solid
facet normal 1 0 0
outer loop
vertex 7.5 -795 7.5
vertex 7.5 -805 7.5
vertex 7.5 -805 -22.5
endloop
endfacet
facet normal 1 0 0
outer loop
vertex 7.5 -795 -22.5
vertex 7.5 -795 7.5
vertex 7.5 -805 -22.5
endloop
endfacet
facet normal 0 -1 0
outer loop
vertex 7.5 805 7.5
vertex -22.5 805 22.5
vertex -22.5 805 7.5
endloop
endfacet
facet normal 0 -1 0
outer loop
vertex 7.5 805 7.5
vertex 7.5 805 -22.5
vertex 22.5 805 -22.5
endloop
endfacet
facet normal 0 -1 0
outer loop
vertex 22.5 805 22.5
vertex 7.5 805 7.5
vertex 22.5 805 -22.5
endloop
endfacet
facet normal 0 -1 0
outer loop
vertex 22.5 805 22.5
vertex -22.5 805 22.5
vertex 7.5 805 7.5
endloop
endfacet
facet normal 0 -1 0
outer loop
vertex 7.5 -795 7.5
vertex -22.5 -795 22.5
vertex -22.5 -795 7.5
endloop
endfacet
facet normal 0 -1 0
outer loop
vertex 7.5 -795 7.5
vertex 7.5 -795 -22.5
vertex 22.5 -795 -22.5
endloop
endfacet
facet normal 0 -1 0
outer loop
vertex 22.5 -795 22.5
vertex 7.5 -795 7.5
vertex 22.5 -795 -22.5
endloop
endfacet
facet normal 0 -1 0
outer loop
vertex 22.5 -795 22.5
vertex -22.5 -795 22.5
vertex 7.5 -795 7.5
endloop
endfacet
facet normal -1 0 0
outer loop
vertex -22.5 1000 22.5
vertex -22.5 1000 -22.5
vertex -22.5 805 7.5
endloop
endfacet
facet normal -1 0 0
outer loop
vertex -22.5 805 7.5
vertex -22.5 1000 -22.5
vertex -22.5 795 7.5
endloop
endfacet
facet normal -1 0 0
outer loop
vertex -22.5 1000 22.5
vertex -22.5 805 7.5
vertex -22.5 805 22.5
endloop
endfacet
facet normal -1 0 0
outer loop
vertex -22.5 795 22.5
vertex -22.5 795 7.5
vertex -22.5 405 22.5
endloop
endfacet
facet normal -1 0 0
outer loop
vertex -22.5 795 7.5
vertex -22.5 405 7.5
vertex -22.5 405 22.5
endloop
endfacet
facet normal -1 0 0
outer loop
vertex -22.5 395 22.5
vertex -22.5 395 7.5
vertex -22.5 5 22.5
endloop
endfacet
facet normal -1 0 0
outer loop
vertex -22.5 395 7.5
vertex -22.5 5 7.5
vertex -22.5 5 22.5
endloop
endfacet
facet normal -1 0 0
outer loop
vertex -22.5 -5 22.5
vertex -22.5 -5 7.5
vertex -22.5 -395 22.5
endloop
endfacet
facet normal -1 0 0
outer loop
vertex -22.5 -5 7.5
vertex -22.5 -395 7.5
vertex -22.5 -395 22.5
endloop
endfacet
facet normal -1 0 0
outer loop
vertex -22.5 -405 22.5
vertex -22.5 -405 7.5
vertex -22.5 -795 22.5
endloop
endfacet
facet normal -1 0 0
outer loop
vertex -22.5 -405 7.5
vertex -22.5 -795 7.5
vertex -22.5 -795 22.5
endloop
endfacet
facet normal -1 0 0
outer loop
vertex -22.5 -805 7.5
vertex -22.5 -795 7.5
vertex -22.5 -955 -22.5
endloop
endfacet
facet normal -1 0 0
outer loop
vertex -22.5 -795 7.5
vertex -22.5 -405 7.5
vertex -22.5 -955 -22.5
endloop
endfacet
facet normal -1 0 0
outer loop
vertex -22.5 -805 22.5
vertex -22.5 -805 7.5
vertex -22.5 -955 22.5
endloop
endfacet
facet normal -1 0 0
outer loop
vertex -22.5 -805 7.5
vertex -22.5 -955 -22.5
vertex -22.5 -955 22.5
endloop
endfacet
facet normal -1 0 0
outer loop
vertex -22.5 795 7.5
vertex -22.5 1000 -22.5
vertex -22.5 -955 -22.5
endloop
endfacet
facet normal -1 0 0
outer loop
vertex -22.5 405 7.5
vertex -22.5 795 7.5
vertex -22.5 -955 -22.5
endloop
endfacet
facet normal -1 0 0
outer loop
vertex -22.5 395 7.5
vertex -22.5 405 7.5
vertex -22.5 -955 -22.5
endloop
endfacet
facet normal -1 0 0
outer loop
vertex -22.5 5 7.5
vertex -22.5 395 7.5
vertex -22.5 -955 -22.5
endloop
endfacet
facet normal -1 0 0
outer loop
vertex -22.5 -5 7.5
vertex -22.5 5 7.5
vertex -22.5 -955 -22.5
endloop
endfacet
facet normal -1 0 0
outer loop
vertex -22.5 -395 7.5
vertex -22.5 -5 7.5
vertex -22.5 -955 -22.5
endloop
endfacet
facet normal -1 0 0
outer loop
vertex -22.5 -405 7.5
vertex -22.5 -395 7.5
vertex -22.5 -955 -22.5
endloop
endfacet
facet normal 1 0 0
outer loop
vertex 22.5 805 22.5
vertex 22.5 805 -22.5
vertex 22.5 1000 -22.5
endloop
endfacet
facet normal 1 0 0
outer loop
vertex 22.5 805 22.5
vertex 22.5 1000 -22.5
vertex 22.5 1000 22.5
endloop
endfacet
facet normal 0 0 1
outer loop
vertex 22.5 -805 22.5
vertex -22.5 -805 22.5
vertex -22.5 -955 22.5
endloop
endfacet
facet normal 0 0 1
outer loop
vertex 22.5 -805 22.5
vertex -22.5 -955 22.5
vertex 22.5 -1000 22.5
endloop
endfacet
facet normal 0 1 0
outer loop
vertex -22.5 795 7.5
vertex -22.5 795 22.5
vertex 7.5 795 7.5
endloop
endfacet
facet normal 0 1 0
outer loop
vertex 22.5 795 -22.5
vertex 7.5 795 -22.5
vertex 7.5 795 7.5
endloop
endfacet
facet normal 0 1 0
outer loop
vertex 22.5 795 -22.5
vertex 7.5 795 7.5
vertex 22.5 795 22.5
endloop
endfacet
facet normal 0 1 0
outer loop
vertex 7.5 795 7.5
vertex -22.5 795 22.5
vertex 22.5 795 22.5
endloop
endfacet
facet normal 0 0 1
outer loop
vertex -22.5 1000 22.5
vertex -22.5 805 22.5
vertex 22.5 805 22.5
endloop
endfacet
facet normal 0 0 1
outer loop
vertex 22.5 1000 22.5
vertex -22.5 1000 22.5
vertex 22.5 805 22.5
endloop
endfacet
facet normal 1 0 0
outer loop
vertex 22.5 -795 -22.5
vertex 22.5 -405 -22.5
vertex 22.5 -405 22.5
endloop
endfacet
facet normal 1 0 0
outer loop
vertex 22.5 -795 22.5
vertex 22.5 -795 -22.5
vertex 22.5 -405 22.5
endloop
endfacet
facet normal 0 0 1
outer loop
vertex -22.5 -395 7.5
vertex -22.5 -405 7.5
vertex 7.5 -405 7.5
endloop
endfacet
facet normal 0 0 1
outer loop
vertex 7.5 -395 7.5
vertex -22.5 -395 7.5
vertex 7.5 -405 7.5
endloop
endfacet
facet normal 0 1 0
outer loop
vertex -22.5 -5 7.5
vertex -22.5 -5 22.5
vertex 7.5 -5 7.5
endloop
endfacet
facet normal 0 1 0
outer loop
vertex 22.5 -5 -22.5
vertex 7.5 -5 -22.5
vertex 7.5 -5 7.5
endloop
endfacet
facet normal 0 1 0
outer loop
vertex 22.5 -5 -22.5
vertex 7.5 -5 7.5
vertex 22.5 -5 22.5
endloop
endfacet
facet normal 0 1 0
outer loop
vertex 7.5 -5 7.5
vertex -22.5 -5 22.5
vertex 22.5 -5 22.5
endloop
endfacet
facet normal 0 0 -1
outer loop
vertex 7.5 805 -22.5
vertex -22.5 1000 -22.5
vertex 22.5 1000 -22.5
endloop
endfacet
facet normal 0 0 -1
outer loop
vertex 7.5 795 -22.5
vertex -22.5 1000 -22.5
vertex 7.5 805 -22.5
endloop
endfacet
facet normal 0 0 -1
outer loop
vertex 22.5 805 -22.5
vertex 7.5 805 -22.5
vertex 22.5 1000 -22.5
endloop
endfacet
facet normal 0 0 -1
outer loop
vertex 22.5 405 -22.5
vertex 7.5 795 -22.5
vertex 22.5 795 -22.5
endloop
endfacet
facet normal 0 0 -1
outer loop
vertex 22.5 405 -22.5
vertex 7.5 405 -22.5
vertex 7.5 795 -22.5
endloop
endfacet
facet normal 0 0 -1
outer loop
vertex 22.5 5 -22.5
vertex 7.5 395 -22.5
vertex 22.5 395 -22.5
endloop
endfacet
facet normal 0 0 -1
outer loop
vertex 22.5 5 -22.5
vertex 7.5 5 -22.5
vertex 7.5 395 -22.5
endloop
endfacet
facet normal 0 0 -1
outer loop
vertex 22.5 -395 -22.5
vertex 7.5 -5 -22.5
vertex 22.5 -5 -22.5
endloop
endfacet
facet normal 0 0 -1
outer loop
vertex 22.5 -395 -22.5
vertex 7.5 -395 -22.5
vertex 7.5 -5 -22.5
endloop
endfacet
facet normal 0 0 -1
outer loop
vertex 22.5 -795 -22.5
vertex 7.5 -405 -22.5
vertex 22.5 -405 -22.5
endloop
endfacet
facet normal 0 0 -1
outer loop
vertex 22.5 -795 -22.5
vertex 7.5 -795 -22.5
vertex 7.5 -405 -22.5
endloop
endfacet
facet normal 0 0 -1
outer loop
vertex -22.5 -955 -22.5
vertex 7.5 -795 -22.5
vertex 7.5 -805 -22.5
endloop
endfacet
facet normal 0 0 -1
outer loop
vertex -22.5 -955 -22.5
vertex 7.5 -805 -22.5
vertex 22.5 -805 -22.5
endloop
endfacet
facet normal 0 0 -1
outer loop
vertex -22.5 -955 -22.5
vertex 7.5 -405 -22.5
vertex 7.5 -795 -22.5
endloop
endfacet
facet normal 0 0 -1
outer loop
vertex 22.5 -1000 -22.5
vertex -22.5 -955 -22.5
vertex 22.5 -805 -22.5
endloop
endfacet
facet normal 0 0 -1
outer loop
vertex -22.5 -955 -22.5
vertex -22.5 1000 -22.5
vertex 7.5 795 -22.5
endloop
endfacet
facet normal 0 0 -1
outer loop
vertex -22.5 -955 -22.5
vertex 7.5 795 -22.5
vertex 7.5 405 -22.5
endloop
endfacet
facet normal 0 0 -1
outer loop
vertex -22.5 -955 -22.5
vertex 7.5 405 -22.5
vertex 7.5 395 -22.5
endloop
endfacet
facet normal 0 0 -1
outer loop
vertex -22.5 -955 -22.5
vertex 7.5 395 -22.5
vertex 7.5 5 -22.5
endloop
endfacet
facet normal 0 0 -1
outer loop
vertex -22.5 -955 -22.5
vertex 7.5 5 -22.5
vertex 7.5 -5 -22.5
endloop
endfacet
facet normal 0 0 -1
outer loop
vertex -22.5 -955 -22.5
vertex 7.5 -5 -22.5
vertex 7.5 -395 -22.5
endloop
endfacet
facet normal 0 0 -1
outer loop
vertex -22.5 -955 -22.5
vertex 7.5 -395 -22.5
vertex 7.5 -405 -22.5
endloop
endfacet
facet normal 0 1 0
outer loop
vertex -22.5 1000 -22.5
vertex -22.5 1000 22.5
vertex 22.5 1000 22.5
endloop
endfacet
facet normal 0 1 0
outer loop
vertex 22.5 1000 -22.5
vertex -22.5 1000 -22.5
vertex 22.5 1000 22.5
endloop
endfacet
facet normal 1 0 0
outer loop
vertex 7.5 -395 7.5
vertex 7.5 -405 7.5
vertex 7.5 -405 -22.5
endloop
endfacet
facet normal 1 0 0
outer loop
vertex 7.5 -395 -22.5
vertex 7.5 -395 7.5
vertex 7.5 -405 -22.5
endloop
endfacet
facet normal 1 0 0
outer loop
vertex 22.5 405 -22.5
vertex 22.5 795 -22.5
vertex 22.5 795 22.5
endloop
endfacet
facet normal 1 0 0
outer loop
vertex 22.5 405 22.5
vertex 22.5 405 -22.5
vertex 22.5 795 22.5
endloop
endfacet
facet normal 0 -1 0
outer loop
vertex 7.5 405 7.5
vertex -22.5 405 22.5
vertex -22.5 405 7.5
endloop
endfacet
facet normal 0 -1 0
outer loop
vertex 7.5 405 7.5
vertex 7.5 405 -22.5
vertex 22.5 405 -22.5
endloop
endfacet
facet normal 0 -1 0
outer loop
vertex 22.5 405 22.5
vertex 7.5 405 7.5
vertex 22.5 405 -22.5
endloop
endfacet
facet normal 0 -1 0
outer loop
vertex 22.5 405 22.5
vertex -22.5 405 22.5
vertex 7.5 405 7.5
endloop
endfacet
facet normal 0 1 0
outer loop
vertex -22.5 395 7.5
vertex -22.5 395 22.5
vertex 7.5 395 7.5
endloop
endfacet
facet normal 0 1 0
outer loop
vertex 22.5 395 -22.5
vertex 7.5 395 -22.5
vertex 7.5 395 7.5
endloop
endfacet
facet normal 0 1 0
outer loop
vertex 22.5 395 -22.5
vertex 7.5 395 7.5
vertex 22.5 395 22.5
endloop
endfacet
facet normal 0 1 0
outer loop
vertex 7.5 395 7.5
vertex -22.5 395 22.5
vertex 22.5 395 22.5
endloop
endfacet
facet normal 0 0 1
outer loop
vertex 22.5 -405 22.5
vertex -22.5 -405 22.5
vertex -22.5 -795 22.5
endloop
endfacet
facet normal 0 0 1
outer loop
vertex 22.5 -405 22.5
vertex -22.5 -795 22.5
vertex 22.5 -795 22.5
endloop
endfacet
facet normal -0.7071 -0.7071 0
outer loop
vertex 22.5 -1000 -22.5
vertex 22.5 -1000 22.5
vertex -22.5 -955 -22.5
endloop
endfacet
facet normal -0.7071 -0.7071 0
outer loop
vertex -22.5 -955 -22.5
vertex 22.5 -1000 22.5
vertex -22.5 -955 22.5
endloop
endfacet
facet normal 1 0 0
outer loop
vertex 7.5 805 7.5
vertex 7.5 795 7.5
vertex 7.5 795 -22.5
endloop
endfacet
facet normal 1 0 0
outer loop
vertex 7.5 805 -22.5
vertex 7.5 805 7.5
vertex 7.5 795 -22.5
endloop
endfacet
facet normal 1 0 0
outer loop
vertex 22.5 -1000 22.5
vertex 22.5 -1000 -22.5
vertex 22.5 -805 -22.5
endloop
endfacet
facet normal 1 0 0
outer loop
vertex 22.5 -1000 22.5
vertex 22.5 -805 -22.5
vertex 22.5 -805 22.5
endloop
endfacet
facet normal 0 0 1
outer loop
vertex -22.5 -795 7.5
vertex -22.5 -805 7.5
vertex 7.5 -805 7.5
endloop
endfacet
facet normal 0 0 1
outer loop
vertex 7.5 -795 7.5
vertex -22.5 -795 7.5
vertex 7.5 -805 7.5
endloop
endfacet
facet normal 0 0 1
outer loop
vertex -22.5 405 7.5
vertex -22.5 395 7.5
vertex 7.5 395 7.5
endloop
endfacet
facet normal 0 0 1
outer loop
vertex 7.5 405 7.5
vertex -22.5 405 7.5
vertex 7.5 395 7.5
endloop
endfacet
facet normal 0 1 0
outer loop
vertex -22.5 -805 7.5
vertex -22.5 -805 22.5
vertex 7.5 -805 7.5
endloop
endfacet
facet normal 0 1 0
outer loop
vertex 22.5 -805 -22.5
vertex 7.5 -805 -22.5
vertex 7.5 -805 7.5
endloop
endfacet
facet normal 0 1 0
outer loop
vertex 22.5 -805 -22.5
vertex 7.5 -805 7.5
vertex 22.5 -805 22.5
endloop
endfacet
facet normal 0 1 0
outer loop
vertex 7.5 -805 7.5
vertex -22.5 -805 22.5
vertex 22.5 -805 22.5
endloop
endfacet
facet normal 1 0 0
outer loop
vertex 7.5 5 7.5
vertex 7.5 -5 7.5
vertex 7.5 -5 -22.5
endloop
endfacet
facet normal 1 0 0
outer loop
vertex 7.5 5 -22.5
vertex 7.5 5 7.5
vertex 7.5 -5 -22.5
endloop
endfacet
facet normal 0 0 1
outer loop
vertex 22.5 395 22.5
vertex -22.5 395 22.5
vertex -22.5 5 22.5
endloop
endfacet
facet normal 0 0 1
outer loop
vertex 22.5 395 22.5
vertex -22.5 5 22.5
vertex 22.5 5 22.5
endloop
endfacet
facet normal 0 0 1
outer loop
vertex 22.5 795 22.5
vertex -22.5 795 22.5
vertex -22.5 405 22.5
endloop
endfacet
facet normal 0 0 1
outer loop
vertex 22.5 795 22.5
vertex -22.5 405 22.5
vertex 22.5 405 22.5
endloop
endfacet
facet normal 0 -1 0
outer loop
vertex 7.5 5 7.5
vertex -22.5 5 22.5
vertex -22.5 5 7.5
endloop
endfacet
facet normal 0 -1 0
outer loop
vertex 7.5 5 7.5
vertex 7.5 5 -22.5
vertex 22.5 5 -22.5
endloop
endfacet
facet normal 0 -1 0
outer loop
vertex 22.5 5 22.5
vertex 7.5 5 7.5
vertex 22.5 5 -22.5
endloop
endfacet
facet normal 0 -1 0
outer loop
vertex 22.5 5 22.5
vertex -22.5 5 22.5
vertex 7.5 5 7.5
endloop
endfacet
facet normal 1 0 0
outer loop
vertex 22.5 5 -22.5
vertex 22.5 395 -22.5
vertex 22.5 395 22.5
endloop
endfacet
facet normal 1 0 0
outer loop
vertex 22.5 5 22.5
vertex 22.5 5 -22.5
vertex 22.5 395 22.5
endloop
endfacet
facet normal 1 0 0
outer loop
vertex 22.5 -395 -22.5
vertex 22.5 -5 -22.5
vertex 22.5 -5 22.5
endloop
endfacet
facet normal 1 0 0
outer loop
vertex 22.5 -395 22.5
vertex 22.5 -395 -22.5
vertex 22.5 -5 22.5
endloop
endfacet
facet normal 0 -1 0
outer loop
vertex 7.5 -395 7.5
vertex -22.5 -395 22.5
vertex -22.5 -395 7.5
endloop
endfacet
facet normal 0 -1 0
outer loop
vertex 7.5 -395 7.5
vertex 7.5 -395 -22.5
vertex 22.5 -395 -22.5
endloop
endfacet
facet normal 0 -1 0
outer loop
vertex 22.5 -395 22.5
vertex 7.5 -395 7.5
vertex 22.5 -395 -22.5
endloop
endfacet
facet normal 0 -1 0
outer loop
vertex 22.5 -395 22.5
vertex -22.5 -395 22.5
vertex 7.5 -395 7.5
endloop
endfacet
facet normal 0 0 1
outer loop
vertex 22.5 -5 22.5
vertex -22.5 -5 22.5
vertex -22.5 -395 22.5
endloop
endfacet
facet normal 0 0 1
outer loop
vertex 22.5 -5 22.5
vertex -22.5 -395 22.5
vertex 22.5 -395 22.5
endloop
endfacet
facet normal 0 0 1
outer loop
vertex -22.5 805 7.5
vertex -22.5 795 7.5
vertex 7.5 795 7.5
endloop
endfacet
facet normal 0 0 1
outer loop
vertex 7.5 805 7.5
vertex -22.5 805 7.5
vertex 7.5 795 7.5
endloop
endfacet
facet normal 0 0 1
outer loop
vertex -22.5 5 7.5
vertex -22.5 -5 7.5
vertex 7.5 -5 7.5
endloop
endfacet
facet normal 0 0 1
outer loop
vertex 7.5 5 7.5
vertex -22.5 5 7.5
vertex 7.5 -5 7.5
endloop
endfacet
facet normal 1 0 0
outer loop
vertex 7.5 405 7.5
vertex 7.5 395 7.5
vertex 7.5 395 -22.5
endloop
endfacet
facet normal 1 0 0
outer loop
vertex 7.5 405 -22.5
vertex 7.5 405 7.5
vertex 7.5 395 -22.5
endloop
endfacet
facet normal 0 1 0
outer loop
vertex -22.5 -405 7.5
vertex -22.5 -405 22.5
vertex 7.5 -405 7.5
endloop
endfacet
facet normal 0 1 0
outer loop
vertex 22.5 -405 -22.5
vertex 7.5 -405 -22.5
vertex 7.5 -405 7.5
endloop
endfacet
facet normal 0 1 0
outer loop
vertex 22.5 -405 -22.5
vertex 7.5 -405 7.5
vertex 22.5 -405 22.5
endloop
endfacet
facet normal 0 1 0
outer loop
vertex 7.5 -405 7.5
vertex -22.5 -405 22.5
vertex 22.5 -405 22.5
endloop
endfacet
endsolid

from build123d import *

# Parameters (mm, degrees)
F0_W            = 45
F0_H            = 45
F1_DEPTH        = 1500
F2_W            = 45
F2_H            = 500
F3_DEPTH        = 45
F5_DEPTH        = 5
F5_COPIES_COUNT = 3
F5_COPIES_PITCH = 400
F8_DEPTH        = 5
F11_DEPTH       = 5


# Not quite as in the source:
# - a pattern or mirror of a feature is missing from the dataset's text; its kind, count and spacing are read off the source's solid


with BuildPart() as f1:
    # F0 (on Front) → F1 (new body, symmetric)
    with BuildSketch(Plane.XZ):
        Rectangle(F0_W, F0_H)
    extrude(amount=F1_DEPTH, both=True)

    # F2 (on face) → F3 (cut, through all)
    with BuildSketch(Plane.XY.offset(22.5)):
        Polygon((22.5, -1000), (-22.5, -955), (-22.5, -1500), (22.5, -1500), align=None)
        with Locations((0, 1250)):
            Rectangle(F2_W, F2_H)
    extrude(amount=-F3_DEPTH, mode=Mode.SUBTRACT)

    # F4 (on Front) → F5 (cut, symmetric)
    with BuildSketch(Plane.XZ):
        Polygon((22.5, 22.5), (-22.5, 22.5), (-22.5, 7.5), (7.5, 7.5), (7.5, -22.5), (22.5, -22.5), align=None)
    f5 = extrude(amount=F5_DEPTH, both=True, mode=Mode.SUBTRACT)

    # F5_copies: F5 ×3
    with Locations(*[(0, i * F5_COPIES_PITCH, 0) for i in range(1, F5_COPIES_COUNT)]):
        add(f5, mode=Mode.SUBTRACT)

    # F7 (on offset) → F8 (cut, symmetric)
    with BuildSketch(Plane.XZ.offset(400)):
        Polygon((-22.5, 22.5), (-22.5, 7.5), (7.5, 7.5), (7.5, -22.5), (22.5, -22.5), (22.5, 22.5), align=None)
    extrude(amount=F8_DEPTH, both=True, mode=Mode.SUBTRACT)

    # F10 (on offset) → F11 (cut, symmetric)
    with BuildSketch(Plane.XZ.offset(800)):
        Polygon((-22.5, 22.5), (-22.5, 7.5), (7.5, 7.5), (7.5, -22.5), (22.5, -22.5), (22.5, 22.5), align=None)
    extrude(amount=F11_DEPTH, both=True, mode=Mode.SUBTRACT)


solid = f1.part
